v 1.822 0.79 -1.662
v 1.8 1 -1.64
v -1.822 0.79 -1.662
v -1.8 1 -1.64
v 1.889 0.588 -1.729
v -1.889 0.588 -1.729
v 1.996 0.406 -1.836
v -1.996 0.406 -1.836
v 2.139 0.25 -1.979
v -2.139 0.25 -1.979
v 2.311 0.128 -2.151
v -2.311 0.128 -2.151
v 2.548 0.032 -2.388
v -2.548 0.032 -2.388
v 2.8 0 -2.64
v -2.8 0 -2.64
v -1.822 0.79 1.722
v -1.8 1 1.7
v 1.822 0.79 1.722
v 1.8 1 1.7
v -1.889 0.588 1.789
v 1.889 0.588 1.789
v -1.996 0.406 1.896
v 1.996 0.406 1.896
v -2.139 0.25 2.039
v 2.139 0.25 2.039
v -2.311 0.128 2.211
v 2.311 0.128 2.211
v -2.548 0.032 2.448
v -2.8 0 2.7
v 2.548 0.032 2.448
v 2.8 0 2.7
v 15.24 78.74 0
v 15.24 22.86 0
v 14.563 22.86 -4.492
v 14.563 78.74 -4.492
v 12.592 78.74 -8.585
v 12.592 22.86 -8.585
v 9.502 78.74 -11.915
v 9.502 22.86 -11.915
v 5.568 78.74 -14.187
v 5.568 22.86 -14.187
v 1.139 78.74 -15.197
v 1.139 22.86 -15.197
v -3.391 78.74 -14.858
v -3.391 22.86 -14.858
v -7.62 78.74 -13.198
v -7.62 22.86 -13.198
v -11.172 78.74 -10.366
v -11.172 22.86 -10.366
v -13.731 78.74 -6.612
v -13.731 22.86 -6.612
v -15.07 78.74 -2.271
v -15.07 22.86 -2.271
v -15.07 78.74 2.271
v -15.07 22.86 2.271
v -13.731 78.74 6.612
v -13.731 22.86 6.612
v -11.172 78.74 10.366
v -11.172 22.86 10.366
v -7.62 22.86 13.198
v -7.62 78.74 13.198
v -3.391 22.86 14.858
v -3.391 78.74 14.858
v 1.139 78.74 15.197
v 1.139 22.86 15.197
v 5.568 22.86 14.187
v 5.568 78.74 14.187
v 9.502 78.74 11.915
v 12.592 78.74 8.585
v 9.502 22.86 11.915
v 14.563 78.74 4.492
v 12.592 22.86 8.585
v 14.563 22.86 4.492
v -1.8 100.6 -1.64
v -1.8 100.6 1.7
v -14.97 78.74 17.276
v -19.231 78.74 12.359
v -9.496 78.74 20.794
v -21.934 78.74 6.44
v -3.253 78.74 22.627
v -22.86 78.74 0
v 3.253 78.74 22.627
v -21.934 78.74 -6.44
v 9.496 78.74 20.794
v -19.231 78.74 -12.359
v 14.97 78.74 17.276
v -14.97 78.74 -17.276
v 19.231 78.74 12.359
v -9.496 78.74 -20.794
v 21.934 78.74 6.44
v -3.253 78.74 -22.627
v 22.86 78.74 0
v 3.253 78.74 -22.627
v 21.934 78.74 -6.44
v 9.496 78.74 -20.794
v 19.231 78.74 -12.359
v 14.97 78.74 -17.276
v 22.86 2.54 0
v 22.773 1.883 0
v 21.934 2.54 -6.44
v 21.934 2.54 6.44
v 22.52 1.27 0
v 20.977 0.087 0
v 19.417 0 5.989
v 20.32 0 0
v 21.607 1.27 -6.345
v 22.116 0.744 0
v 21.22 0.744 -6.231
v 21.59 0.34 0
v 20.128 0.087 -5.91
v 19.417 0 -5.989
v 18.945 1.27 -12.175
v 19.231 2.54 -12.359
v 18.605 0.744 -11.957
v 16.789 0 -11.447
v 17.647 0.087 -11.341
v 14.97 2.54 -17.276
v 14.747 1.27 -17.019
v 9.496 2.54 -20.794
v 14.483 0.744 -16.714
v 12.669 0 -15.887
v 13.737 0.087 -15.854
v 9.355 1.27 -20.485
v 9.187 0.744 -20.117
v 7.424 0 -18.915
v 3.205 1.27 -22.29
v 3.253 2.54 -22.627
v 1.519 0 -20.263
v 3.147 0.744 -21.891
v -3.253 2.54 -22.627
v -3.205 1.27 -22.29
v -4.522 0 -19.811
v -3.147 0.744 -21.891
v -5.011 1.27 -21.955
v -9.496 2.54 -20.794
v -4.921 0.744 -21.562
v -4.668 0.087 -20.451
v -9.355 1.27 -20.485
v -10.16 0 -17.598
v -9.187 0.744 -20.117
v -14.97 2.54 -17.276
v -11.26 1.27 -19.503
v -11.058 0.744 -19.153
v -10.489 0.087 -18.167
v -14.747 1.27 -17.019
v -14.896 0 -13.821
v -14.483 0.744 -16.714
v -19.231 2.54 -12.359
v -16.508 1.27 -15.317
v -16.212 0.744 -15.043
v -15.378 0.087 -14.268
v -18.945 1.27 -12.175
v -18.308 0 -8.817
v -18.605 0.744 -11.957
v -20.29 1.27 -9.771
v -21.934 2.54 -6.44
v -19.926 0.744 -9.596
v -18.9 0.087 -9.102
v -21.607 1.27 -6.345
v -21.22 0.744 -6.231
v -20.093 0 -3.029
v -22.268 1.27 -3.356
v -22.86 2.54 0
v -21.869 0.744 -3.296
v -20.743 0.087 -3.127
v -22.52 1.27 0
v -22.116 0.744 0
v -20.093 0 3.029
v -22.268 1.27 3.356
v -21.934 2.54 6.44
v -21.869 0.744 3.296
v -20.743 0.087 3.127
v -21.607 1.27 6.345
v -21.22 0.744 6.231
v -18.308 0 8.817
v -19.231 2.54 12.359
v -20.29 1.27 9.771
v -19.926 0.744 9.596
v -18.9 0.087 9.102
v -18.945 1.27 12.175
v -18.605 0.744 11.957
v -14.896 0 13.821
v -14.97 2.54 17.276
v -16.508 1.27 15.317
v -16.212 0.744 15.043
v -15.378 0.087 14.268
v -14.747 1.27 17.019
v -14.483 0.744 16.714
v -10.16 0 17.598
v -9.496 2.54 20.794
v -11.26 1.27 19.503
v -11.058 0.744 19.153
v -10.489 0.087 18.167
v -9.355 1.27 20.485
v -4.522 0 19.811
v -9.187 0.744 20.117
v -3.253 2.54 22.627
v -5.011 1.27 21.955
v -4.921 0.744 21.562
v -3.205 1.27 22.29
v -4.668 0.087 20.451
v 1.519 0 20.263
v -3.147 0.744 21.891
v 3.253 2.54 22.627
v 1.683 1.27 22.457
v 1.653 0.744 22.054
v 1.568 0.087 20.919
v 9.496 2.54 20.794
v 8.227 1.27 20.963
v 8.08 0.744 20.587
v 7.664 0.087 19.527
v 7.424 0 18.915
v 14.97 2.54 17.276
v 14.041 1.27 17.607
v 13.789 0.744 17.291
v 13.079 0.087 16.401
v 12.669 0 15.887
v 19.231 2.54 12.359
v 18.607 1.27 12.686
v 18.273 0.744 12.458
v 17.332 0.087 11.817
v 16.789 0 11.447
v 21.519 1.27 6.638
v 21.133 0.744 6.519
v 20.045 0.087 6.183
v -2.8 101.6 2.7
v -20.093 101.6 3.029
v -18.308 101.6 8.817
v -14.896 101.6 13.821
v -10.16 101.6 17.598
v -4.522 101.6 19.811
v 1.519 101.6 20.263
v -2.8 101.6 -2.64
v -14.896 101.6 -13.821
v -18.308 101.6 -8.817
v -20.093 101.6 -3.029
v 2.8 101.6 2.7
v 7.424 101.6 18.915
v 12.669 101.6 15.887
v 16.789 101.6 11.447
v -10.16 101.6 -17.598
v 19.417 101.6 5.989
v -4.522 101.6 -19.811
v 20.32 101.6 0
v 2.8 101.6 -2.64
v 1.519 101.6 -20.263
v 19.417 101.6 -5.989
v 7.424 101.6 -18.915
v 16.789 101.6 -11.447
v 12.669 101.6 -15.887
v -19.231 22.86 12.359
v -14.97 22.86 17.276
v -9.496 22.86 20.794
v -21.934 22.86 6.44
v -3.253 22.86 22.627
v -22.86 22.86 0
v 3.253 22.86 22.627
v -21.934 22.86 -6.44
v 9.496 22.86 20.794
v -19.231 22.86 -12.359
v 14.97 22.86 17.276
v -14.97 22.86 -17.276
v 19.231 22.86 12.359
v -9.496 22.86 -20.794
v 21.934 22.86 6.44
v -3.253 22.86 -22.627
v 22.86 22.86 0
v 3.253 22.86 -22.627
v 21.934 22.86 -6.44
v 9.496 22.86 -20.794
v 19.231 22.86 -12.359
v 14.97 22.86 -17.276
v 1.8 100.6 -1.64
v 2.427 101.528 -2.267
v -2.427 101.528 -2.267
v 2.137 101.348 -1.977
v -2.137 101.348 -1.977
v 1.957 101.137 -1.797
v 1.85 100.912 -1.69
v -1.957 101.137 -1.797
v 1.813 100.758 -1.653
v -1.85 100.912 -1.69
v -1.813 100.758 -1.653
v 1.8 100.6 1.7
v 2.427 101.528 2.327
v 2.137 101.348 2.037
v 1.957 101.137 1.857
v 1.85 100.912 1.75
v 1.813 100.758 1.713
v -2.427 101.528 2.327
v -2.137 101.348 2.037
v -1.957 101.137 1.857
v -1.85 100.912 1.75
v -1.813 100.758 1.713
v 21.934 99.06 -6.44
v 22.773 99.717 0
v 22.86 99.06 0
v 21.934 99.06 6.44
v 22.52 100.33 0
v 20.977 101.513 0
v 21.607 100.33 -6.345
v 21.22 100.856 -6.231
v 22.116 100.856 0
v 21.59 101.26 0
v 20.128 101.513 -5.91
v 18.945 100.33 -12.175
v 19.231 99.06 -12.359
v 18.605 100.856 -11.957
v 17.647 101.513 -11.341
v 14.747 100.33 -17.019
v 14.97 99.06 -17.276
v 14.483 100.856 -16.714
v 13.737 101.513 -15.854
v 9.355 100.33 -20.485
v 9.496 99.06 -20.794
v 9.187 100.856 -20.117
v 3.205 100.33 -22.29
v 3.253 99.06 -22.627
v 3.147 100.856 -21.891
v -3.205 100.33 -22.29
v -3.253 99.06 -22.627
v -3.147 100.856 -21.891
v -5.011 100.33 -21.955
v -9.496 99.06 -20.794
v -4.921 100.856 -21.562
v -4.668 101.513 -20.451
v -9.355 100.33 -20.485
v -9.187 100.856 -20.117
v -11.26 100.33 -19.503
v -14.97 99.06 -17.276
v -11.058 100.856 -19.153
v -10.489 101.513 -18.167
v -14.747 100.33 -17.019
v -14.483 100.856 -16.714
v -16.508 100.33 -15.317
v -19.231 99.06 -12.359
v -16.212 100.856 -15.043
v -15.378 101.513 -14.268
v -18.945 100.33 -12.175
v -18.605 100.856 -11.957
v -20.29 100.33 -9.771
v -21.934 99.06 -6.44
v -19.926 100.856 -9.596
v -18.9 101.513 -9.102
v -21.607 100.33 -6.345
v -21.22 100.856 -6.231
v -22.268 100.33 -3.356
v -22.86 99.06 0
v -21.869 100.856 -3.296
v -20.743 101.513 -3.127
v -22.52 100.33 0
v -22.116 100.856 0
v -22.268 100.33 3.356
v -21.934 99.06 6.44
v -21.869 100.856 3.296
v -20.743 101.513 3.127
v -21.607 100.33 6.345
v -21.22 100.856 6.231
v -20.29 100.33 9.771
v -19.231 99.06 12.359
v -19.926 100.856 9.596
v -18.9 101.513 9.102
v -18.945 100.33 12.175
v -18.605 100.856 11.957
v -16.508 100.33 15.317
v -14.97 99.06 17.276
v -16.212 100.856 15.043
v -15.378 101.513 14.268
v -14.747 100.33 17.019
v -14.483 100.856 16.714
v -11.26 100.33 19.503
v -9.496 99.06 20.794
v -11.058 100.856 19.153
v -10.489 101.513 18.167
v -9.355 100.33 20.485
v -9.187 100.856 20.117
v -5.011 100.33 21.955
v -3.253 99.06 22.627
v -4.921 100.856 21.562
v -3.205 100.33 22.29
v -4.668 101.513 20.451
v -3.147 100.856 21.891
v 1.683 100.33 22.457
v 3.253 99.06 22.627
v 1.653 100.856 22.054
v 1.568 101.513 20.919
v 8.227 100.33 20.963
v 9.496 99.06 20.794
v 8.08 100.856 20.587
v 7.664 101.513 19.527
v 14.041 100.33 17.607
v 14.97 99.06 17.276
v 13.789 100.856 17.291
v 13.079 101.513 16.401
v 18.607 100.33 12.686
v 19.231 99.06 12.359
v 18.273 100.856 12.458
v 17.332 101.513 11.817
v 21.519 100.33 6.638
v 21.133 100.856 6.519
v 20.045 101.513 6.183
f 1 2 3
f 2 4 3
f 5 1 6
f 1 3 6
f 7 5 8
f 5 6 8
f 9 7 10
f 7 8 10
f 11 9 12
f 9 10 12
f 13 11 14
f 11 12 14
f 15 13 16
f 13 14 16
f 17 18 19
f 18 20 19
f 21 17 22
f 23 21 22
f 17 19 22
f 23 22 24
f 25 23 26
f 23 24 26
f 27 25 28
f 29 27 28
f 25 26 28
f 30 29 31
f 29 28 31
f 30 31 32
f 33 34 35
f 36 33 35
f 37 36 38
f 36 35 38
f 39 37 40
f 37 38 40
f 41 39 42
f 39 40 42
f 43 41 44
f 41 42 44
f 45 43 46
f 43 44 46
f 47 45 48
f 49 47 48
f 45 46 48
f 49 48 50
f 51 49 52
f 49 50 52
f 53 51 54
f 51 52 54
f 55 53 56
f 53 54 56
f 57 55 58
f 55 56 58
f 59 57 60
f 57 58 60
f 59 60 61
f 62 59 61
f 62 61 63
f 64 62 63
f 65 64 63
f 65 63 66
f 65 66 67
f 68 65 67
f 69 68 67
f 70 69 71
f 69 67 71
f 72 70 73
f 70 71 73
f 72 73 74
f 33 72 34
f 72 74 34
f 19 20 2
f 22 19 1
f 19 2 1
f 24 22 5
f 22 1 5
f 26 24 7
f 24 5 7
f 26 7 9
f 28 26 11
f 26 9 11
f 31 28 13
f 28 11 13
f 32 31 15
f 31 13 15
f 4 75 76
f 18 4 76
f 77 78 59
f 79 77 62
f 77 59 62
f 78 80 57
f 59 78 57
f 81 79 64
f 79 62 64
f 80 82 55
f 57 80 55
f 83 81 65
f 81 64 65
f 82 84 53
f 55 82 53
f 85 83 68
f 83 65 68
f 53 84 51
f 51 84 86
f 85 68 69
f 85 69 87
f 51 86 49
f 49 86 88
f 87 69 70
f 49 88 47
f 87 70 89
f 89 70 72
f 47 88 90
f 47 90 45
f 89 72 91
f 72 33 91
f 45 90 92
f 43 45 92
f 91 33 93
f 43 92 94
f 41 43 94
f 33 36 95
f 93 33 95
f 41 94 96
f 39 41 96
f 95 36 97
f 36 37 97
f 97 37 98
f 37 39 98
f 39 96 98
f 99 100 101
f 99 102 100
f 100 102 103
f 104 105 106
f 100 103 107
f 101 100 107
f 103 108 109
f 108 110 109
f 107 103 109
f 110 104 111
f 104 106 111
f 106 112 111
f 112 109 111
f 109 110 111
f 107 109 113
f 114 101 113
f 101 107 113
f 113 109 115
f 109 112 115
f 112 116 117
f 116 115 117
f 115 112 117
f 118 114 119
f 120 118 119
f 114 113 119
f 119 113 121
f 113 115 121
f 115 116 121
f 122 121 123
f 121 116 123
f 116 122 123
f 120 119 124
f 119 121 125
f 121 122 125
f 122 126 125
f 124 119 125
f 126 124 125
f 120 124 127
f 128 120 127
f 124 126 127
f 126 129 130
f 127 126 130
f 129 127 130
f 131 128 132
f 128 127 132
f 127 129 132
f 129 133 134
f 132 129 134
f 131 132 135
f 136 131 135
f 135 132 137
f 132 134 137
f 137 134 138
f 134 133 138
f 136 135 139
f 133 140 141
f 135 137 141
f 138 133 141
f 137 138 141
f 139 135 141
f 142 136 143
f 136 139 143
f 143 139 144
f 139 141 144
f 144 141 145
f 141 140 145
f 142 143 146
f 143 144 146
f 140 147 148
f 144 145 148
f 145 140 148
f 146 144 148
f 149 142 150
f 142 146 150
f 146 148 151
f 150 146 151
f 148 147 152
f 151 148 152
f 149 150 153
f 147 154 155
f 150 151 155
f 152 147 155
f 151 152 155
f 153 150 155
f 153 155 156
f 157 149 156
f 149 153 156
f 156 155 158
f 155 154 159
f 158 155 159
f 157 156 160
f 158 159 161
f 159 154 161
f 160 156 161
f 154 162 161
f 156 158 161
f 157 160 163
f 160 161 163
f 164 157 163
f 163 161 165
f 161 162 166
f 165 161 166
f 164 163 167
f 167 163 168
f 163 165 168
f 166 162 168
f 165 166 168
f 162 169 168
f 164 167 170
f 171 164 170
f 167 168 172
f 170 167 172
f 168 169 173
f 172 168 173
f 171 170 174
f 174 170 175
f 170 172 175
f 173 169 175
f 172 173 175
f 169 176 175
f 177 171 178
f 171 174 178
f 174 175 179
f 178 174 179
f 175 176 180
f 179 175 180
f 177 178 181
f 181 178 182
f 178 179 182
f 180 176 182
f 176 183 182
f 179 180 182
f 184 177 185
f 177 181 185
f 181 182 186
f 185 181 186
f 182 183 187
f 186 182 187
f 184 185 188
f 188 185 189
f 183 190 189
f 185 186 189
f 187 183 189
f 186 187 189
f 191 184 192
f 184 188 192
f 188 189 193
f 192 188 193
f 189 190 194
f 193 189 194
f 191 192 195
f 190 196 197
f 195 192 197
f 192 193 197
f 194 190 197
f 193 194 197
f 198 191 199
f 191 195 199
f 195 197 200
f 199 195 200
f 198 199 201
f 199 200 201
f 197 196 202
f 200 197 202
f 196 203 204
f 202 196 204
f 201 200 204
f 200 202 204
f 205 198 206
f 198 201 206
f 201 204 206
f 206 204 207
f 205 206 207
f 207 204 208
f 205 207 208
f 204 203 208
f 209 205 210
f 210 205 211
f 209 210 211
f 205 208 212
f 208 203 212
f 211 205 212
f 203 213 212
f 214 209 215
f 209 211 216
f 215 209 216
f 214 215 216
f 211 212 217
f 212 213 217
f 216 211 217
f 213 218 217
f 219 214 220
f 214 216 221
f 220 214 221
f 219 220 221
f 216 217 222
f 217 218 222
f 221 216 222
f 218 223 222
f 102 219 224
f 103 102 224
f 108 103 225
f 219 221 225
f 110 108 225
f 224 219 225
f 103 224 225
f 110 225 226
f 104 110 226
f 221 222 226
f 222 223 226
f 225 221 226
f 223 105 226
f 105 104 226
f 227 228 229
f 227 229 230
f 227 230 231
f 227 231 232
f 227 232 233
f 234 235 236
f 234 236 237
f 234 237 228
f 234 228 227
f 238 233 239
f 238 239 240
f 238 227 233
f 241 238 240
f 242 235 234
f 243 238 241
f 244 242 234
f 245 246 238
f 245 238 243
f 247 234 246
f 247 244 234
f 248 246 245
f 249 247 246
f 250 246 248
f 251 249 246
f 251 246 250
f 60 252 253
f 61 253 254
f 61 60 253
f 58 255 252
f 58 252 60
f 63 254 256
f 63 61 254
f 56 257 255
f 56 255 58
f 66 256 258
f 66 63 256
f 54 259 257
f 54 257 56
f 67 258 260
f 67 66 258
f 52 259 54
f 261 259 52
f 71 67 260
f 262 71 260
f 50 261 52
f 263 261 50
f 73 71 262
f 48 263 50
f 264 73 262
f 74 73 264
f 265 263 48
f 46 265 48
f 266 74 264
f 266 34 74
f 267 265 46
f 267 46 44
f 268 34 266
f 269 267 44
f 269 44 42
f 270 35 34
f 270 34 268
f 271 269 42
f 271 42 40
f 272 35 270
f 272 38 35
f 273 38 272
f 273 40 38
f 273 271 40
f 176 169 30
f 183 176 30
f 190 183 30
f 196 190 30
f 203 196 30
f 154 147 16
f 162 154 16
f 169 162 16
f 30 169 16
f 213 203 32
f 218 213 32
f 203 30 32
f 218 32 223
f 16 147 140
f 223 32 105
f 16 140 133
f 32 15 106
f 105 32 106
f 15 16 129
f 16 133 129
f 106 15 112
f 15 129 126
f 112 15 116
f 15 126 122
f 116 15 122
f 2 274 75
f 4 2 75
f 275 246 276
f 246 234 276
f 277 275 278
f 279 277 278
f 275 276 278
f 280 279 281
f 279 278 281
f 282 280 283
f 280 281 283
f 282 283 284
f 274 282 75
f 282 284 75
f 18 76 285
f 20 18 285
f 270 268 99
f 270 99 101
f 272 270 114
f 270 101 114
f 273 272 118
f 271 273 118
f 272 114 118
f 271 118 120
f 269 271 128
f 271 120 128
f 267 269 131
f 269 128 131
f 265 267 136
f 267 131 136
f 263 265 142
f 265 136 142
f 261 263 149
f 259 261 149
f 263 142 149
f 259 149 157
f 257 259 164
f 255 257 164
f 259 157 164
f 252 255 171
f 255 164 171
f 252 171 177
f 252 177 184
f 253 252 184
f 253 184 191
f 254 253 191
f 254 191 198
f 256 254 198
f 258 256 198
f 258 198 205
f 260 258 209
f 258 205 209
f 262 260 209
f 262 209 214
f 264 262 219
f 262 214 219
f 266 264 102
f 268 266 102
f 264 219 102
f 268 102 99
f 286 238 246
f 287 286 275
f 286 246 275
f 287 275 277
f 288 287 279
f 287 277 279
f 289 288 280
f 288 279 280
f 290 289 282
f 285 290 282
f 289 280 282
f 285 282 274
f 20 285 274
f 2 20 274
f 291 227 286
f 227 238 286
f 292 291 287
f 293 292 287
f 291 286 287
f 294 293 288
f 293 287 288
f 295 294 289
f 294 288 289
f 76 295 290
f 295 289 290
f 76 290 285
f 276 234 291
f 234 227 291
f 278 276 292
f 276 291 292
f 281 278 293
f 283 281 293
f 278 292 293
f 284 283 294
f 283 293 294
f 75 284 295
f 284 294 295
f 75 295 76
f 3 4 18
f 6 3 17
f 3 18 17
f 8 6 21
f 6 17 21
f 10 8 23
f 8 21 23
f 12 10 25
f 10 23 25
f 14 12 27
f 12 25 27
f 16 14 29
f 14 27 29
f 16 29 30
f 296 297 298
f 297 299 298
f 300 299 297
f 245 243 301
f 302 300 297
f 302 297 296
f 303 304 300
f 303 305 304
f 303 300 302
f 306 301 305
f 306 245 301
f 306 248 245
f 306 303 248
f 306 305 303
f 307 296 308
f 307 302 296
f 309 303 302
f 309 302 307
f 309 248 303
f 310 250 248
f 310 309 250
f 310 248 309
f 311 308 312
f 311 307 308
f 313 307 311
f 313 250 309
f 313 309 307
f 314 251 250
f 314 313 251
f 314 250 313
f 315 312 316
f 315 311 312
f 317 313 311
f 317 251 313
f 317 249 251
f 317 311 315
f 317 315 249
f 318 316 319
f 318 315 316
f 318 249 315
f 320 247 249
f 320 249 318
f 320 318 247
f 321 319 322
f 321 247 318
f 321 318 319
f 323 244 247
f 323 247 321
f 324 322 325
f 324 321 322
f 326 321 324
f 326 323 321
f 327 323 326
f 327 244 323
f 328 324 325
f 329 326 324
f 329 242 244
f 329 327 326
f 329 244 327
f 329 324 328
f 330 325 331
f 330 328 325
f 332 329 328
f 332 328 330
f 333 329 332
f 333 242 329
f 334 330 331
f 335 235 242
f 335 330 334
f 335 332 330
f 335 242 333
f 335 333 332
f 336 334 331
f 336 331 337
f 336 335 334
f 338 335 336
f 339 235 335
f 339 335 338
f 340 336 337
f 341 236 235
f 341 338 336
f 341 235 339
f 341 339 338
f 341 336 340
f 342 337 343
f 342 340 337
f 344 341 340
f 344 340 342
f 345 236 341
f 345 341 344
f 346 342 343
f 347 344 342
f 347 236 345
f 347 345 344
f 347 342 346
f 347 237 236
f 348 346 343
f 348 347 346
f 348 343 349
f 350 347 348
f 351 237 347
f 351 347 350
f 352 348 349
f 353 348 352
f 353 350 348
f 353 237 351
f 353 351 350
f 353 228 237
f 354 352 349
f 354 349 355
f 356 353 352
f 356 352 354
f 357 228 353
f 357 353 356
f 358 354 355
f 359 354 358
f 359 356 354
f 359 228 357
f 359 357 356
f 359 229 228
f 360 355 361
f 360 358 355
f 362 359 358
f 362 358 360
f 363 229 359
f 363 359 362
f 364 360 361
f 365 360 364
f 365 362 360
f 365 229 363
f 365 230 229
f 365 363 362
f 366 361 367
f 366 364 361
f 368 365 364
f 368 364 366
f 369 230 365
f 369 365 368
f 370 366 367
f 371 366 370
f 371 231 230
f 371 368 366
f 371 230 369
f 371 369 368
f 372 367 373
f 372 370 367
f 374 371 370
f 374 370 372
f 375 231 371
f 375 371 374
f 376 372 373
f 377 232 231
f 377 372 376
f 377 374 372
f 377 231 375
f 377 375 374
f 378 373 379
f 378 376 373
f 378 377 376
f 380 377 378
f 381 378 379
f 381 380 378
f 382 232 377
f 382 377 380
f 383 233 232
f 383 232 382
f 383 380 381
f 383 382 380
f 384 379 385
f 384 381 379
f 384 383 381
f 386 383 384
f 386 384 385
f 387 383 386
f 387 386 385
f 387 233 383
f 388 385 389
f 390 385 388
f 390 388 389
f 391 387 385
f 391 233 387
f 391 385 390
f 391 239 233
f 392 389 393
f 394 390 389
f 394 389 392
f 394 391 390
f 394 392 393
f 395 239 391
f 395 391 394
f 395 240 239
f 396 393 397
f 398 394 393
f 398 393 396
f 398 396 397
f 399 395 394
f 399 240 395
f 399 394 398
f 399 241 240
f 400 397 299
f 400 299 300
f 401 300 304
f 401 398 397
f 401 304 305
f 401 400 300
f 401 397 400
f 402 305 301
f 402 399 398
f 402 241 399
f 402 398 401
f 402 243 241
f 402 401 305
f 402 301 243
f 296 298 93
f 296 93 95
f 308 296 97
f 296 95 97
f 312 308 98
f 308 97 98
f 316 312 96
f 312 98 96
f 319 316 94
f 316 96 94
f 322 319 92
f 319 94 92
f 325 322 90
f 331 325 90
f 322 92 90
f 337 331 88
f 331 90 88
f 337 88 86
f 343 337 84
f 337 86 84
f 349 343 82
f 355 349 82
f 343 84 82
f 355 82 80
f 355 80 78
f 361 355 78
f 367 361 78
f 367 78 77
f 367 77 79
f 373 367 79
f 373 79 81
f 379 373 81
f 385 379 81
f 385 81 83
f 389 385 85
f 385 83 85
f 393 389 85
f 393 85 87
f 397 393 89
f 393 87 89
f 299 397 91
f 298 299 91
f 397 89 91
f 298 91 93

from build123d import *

# Parameters (mm, degrees)
SKETCH1_R           = 22.86
BOSS_EXTRUDE1_DEPTH = 22.86
SKETCH3_R           = 15.24
BOSS_EXTRUDE2_DEPTH = 55.88
SKETCH4_R           = 22.86
BOSS_EXTRUDE3_DEPTH = 22.86
FILLET3_R           = 2.54
CUT_EXTRUDE1_DEPTH  = 102.6
FILLET4_R           = 1


with BuildPart() as part:
    # Sketch1 → Boss-Extrude1 (new body)
    with BuildSketch(Plane(origin=(0, 0, 0), x_dir=(1, 0, 0), z_dir=(0, 1, 0))):
        Circle(SKETCH1_R)
    extrude(amount=BOSS_EXTRUDE1_DEPTH)

    # Sketch3 → Boss-Extrude2 (add)
    with BuildSketch(Plane(origin=(0, 22.86, 0), x_dir=(1, 0, 0), z_dir=(0, 1, 0))):
        Circle(SKETCH3_R)
    extrude(amount=BOSS_EXTRUDE2_DEPTH)

    # Sketch4 → Boss-Extrude3 (add)
    with BuildSketch(Plane(origin=(0, 78.74, 0), x_dir=(1, 0, 0), z_dir=(0, 1, 0))):
        Circle(SKETCH4_R)
    extrude(amount=BOSS_EXTRUDE3_DEPTH)

    # Fillet3
    fillet3_edges = [part.edges().sort_by_distance(p)[0] for p in [
        (-22.86, 101.6, 0),
        (-22.86, 0, 0),
    ]]
    fillet(fillet3_edges, radius=FILLET3_R)

    # Sketch5 → Cut-Extrude1 (cut, through all)
    with BuildSketch(Plane(origin=(0, 101.6, 0), x_dir=(1, 0, 0), z_dir=(0, 1, 0))):
        Polygon((-1.8, -0.03), (-1.8, -1.7), (1.8, -1.7), (1.8, 1.64), (-1.8, 1.64), align=None)
    extrude(amount=-CUT_EXTRUDE1_DEPTH, mode=Mode.SUBTRACT)

    # Fillet4
    fillet4_edges = [part.edges().sort_by_distance(p)[0] for p in [
        (0, 0, -1.64),
        (1.8, 0, 0.03),
        (0, 0, 1.7),
        (-1.8, 0, 0.03),
        (0, 101.6, -1.64),
        (-1.8, 101.6, 0.03),
        (0, 101.6, 1.7),
        (1.8, 101.6, 0.03),
    ]]
    fillet(fillet4_edges, radius=FILLET4_R)


solid = part.part
